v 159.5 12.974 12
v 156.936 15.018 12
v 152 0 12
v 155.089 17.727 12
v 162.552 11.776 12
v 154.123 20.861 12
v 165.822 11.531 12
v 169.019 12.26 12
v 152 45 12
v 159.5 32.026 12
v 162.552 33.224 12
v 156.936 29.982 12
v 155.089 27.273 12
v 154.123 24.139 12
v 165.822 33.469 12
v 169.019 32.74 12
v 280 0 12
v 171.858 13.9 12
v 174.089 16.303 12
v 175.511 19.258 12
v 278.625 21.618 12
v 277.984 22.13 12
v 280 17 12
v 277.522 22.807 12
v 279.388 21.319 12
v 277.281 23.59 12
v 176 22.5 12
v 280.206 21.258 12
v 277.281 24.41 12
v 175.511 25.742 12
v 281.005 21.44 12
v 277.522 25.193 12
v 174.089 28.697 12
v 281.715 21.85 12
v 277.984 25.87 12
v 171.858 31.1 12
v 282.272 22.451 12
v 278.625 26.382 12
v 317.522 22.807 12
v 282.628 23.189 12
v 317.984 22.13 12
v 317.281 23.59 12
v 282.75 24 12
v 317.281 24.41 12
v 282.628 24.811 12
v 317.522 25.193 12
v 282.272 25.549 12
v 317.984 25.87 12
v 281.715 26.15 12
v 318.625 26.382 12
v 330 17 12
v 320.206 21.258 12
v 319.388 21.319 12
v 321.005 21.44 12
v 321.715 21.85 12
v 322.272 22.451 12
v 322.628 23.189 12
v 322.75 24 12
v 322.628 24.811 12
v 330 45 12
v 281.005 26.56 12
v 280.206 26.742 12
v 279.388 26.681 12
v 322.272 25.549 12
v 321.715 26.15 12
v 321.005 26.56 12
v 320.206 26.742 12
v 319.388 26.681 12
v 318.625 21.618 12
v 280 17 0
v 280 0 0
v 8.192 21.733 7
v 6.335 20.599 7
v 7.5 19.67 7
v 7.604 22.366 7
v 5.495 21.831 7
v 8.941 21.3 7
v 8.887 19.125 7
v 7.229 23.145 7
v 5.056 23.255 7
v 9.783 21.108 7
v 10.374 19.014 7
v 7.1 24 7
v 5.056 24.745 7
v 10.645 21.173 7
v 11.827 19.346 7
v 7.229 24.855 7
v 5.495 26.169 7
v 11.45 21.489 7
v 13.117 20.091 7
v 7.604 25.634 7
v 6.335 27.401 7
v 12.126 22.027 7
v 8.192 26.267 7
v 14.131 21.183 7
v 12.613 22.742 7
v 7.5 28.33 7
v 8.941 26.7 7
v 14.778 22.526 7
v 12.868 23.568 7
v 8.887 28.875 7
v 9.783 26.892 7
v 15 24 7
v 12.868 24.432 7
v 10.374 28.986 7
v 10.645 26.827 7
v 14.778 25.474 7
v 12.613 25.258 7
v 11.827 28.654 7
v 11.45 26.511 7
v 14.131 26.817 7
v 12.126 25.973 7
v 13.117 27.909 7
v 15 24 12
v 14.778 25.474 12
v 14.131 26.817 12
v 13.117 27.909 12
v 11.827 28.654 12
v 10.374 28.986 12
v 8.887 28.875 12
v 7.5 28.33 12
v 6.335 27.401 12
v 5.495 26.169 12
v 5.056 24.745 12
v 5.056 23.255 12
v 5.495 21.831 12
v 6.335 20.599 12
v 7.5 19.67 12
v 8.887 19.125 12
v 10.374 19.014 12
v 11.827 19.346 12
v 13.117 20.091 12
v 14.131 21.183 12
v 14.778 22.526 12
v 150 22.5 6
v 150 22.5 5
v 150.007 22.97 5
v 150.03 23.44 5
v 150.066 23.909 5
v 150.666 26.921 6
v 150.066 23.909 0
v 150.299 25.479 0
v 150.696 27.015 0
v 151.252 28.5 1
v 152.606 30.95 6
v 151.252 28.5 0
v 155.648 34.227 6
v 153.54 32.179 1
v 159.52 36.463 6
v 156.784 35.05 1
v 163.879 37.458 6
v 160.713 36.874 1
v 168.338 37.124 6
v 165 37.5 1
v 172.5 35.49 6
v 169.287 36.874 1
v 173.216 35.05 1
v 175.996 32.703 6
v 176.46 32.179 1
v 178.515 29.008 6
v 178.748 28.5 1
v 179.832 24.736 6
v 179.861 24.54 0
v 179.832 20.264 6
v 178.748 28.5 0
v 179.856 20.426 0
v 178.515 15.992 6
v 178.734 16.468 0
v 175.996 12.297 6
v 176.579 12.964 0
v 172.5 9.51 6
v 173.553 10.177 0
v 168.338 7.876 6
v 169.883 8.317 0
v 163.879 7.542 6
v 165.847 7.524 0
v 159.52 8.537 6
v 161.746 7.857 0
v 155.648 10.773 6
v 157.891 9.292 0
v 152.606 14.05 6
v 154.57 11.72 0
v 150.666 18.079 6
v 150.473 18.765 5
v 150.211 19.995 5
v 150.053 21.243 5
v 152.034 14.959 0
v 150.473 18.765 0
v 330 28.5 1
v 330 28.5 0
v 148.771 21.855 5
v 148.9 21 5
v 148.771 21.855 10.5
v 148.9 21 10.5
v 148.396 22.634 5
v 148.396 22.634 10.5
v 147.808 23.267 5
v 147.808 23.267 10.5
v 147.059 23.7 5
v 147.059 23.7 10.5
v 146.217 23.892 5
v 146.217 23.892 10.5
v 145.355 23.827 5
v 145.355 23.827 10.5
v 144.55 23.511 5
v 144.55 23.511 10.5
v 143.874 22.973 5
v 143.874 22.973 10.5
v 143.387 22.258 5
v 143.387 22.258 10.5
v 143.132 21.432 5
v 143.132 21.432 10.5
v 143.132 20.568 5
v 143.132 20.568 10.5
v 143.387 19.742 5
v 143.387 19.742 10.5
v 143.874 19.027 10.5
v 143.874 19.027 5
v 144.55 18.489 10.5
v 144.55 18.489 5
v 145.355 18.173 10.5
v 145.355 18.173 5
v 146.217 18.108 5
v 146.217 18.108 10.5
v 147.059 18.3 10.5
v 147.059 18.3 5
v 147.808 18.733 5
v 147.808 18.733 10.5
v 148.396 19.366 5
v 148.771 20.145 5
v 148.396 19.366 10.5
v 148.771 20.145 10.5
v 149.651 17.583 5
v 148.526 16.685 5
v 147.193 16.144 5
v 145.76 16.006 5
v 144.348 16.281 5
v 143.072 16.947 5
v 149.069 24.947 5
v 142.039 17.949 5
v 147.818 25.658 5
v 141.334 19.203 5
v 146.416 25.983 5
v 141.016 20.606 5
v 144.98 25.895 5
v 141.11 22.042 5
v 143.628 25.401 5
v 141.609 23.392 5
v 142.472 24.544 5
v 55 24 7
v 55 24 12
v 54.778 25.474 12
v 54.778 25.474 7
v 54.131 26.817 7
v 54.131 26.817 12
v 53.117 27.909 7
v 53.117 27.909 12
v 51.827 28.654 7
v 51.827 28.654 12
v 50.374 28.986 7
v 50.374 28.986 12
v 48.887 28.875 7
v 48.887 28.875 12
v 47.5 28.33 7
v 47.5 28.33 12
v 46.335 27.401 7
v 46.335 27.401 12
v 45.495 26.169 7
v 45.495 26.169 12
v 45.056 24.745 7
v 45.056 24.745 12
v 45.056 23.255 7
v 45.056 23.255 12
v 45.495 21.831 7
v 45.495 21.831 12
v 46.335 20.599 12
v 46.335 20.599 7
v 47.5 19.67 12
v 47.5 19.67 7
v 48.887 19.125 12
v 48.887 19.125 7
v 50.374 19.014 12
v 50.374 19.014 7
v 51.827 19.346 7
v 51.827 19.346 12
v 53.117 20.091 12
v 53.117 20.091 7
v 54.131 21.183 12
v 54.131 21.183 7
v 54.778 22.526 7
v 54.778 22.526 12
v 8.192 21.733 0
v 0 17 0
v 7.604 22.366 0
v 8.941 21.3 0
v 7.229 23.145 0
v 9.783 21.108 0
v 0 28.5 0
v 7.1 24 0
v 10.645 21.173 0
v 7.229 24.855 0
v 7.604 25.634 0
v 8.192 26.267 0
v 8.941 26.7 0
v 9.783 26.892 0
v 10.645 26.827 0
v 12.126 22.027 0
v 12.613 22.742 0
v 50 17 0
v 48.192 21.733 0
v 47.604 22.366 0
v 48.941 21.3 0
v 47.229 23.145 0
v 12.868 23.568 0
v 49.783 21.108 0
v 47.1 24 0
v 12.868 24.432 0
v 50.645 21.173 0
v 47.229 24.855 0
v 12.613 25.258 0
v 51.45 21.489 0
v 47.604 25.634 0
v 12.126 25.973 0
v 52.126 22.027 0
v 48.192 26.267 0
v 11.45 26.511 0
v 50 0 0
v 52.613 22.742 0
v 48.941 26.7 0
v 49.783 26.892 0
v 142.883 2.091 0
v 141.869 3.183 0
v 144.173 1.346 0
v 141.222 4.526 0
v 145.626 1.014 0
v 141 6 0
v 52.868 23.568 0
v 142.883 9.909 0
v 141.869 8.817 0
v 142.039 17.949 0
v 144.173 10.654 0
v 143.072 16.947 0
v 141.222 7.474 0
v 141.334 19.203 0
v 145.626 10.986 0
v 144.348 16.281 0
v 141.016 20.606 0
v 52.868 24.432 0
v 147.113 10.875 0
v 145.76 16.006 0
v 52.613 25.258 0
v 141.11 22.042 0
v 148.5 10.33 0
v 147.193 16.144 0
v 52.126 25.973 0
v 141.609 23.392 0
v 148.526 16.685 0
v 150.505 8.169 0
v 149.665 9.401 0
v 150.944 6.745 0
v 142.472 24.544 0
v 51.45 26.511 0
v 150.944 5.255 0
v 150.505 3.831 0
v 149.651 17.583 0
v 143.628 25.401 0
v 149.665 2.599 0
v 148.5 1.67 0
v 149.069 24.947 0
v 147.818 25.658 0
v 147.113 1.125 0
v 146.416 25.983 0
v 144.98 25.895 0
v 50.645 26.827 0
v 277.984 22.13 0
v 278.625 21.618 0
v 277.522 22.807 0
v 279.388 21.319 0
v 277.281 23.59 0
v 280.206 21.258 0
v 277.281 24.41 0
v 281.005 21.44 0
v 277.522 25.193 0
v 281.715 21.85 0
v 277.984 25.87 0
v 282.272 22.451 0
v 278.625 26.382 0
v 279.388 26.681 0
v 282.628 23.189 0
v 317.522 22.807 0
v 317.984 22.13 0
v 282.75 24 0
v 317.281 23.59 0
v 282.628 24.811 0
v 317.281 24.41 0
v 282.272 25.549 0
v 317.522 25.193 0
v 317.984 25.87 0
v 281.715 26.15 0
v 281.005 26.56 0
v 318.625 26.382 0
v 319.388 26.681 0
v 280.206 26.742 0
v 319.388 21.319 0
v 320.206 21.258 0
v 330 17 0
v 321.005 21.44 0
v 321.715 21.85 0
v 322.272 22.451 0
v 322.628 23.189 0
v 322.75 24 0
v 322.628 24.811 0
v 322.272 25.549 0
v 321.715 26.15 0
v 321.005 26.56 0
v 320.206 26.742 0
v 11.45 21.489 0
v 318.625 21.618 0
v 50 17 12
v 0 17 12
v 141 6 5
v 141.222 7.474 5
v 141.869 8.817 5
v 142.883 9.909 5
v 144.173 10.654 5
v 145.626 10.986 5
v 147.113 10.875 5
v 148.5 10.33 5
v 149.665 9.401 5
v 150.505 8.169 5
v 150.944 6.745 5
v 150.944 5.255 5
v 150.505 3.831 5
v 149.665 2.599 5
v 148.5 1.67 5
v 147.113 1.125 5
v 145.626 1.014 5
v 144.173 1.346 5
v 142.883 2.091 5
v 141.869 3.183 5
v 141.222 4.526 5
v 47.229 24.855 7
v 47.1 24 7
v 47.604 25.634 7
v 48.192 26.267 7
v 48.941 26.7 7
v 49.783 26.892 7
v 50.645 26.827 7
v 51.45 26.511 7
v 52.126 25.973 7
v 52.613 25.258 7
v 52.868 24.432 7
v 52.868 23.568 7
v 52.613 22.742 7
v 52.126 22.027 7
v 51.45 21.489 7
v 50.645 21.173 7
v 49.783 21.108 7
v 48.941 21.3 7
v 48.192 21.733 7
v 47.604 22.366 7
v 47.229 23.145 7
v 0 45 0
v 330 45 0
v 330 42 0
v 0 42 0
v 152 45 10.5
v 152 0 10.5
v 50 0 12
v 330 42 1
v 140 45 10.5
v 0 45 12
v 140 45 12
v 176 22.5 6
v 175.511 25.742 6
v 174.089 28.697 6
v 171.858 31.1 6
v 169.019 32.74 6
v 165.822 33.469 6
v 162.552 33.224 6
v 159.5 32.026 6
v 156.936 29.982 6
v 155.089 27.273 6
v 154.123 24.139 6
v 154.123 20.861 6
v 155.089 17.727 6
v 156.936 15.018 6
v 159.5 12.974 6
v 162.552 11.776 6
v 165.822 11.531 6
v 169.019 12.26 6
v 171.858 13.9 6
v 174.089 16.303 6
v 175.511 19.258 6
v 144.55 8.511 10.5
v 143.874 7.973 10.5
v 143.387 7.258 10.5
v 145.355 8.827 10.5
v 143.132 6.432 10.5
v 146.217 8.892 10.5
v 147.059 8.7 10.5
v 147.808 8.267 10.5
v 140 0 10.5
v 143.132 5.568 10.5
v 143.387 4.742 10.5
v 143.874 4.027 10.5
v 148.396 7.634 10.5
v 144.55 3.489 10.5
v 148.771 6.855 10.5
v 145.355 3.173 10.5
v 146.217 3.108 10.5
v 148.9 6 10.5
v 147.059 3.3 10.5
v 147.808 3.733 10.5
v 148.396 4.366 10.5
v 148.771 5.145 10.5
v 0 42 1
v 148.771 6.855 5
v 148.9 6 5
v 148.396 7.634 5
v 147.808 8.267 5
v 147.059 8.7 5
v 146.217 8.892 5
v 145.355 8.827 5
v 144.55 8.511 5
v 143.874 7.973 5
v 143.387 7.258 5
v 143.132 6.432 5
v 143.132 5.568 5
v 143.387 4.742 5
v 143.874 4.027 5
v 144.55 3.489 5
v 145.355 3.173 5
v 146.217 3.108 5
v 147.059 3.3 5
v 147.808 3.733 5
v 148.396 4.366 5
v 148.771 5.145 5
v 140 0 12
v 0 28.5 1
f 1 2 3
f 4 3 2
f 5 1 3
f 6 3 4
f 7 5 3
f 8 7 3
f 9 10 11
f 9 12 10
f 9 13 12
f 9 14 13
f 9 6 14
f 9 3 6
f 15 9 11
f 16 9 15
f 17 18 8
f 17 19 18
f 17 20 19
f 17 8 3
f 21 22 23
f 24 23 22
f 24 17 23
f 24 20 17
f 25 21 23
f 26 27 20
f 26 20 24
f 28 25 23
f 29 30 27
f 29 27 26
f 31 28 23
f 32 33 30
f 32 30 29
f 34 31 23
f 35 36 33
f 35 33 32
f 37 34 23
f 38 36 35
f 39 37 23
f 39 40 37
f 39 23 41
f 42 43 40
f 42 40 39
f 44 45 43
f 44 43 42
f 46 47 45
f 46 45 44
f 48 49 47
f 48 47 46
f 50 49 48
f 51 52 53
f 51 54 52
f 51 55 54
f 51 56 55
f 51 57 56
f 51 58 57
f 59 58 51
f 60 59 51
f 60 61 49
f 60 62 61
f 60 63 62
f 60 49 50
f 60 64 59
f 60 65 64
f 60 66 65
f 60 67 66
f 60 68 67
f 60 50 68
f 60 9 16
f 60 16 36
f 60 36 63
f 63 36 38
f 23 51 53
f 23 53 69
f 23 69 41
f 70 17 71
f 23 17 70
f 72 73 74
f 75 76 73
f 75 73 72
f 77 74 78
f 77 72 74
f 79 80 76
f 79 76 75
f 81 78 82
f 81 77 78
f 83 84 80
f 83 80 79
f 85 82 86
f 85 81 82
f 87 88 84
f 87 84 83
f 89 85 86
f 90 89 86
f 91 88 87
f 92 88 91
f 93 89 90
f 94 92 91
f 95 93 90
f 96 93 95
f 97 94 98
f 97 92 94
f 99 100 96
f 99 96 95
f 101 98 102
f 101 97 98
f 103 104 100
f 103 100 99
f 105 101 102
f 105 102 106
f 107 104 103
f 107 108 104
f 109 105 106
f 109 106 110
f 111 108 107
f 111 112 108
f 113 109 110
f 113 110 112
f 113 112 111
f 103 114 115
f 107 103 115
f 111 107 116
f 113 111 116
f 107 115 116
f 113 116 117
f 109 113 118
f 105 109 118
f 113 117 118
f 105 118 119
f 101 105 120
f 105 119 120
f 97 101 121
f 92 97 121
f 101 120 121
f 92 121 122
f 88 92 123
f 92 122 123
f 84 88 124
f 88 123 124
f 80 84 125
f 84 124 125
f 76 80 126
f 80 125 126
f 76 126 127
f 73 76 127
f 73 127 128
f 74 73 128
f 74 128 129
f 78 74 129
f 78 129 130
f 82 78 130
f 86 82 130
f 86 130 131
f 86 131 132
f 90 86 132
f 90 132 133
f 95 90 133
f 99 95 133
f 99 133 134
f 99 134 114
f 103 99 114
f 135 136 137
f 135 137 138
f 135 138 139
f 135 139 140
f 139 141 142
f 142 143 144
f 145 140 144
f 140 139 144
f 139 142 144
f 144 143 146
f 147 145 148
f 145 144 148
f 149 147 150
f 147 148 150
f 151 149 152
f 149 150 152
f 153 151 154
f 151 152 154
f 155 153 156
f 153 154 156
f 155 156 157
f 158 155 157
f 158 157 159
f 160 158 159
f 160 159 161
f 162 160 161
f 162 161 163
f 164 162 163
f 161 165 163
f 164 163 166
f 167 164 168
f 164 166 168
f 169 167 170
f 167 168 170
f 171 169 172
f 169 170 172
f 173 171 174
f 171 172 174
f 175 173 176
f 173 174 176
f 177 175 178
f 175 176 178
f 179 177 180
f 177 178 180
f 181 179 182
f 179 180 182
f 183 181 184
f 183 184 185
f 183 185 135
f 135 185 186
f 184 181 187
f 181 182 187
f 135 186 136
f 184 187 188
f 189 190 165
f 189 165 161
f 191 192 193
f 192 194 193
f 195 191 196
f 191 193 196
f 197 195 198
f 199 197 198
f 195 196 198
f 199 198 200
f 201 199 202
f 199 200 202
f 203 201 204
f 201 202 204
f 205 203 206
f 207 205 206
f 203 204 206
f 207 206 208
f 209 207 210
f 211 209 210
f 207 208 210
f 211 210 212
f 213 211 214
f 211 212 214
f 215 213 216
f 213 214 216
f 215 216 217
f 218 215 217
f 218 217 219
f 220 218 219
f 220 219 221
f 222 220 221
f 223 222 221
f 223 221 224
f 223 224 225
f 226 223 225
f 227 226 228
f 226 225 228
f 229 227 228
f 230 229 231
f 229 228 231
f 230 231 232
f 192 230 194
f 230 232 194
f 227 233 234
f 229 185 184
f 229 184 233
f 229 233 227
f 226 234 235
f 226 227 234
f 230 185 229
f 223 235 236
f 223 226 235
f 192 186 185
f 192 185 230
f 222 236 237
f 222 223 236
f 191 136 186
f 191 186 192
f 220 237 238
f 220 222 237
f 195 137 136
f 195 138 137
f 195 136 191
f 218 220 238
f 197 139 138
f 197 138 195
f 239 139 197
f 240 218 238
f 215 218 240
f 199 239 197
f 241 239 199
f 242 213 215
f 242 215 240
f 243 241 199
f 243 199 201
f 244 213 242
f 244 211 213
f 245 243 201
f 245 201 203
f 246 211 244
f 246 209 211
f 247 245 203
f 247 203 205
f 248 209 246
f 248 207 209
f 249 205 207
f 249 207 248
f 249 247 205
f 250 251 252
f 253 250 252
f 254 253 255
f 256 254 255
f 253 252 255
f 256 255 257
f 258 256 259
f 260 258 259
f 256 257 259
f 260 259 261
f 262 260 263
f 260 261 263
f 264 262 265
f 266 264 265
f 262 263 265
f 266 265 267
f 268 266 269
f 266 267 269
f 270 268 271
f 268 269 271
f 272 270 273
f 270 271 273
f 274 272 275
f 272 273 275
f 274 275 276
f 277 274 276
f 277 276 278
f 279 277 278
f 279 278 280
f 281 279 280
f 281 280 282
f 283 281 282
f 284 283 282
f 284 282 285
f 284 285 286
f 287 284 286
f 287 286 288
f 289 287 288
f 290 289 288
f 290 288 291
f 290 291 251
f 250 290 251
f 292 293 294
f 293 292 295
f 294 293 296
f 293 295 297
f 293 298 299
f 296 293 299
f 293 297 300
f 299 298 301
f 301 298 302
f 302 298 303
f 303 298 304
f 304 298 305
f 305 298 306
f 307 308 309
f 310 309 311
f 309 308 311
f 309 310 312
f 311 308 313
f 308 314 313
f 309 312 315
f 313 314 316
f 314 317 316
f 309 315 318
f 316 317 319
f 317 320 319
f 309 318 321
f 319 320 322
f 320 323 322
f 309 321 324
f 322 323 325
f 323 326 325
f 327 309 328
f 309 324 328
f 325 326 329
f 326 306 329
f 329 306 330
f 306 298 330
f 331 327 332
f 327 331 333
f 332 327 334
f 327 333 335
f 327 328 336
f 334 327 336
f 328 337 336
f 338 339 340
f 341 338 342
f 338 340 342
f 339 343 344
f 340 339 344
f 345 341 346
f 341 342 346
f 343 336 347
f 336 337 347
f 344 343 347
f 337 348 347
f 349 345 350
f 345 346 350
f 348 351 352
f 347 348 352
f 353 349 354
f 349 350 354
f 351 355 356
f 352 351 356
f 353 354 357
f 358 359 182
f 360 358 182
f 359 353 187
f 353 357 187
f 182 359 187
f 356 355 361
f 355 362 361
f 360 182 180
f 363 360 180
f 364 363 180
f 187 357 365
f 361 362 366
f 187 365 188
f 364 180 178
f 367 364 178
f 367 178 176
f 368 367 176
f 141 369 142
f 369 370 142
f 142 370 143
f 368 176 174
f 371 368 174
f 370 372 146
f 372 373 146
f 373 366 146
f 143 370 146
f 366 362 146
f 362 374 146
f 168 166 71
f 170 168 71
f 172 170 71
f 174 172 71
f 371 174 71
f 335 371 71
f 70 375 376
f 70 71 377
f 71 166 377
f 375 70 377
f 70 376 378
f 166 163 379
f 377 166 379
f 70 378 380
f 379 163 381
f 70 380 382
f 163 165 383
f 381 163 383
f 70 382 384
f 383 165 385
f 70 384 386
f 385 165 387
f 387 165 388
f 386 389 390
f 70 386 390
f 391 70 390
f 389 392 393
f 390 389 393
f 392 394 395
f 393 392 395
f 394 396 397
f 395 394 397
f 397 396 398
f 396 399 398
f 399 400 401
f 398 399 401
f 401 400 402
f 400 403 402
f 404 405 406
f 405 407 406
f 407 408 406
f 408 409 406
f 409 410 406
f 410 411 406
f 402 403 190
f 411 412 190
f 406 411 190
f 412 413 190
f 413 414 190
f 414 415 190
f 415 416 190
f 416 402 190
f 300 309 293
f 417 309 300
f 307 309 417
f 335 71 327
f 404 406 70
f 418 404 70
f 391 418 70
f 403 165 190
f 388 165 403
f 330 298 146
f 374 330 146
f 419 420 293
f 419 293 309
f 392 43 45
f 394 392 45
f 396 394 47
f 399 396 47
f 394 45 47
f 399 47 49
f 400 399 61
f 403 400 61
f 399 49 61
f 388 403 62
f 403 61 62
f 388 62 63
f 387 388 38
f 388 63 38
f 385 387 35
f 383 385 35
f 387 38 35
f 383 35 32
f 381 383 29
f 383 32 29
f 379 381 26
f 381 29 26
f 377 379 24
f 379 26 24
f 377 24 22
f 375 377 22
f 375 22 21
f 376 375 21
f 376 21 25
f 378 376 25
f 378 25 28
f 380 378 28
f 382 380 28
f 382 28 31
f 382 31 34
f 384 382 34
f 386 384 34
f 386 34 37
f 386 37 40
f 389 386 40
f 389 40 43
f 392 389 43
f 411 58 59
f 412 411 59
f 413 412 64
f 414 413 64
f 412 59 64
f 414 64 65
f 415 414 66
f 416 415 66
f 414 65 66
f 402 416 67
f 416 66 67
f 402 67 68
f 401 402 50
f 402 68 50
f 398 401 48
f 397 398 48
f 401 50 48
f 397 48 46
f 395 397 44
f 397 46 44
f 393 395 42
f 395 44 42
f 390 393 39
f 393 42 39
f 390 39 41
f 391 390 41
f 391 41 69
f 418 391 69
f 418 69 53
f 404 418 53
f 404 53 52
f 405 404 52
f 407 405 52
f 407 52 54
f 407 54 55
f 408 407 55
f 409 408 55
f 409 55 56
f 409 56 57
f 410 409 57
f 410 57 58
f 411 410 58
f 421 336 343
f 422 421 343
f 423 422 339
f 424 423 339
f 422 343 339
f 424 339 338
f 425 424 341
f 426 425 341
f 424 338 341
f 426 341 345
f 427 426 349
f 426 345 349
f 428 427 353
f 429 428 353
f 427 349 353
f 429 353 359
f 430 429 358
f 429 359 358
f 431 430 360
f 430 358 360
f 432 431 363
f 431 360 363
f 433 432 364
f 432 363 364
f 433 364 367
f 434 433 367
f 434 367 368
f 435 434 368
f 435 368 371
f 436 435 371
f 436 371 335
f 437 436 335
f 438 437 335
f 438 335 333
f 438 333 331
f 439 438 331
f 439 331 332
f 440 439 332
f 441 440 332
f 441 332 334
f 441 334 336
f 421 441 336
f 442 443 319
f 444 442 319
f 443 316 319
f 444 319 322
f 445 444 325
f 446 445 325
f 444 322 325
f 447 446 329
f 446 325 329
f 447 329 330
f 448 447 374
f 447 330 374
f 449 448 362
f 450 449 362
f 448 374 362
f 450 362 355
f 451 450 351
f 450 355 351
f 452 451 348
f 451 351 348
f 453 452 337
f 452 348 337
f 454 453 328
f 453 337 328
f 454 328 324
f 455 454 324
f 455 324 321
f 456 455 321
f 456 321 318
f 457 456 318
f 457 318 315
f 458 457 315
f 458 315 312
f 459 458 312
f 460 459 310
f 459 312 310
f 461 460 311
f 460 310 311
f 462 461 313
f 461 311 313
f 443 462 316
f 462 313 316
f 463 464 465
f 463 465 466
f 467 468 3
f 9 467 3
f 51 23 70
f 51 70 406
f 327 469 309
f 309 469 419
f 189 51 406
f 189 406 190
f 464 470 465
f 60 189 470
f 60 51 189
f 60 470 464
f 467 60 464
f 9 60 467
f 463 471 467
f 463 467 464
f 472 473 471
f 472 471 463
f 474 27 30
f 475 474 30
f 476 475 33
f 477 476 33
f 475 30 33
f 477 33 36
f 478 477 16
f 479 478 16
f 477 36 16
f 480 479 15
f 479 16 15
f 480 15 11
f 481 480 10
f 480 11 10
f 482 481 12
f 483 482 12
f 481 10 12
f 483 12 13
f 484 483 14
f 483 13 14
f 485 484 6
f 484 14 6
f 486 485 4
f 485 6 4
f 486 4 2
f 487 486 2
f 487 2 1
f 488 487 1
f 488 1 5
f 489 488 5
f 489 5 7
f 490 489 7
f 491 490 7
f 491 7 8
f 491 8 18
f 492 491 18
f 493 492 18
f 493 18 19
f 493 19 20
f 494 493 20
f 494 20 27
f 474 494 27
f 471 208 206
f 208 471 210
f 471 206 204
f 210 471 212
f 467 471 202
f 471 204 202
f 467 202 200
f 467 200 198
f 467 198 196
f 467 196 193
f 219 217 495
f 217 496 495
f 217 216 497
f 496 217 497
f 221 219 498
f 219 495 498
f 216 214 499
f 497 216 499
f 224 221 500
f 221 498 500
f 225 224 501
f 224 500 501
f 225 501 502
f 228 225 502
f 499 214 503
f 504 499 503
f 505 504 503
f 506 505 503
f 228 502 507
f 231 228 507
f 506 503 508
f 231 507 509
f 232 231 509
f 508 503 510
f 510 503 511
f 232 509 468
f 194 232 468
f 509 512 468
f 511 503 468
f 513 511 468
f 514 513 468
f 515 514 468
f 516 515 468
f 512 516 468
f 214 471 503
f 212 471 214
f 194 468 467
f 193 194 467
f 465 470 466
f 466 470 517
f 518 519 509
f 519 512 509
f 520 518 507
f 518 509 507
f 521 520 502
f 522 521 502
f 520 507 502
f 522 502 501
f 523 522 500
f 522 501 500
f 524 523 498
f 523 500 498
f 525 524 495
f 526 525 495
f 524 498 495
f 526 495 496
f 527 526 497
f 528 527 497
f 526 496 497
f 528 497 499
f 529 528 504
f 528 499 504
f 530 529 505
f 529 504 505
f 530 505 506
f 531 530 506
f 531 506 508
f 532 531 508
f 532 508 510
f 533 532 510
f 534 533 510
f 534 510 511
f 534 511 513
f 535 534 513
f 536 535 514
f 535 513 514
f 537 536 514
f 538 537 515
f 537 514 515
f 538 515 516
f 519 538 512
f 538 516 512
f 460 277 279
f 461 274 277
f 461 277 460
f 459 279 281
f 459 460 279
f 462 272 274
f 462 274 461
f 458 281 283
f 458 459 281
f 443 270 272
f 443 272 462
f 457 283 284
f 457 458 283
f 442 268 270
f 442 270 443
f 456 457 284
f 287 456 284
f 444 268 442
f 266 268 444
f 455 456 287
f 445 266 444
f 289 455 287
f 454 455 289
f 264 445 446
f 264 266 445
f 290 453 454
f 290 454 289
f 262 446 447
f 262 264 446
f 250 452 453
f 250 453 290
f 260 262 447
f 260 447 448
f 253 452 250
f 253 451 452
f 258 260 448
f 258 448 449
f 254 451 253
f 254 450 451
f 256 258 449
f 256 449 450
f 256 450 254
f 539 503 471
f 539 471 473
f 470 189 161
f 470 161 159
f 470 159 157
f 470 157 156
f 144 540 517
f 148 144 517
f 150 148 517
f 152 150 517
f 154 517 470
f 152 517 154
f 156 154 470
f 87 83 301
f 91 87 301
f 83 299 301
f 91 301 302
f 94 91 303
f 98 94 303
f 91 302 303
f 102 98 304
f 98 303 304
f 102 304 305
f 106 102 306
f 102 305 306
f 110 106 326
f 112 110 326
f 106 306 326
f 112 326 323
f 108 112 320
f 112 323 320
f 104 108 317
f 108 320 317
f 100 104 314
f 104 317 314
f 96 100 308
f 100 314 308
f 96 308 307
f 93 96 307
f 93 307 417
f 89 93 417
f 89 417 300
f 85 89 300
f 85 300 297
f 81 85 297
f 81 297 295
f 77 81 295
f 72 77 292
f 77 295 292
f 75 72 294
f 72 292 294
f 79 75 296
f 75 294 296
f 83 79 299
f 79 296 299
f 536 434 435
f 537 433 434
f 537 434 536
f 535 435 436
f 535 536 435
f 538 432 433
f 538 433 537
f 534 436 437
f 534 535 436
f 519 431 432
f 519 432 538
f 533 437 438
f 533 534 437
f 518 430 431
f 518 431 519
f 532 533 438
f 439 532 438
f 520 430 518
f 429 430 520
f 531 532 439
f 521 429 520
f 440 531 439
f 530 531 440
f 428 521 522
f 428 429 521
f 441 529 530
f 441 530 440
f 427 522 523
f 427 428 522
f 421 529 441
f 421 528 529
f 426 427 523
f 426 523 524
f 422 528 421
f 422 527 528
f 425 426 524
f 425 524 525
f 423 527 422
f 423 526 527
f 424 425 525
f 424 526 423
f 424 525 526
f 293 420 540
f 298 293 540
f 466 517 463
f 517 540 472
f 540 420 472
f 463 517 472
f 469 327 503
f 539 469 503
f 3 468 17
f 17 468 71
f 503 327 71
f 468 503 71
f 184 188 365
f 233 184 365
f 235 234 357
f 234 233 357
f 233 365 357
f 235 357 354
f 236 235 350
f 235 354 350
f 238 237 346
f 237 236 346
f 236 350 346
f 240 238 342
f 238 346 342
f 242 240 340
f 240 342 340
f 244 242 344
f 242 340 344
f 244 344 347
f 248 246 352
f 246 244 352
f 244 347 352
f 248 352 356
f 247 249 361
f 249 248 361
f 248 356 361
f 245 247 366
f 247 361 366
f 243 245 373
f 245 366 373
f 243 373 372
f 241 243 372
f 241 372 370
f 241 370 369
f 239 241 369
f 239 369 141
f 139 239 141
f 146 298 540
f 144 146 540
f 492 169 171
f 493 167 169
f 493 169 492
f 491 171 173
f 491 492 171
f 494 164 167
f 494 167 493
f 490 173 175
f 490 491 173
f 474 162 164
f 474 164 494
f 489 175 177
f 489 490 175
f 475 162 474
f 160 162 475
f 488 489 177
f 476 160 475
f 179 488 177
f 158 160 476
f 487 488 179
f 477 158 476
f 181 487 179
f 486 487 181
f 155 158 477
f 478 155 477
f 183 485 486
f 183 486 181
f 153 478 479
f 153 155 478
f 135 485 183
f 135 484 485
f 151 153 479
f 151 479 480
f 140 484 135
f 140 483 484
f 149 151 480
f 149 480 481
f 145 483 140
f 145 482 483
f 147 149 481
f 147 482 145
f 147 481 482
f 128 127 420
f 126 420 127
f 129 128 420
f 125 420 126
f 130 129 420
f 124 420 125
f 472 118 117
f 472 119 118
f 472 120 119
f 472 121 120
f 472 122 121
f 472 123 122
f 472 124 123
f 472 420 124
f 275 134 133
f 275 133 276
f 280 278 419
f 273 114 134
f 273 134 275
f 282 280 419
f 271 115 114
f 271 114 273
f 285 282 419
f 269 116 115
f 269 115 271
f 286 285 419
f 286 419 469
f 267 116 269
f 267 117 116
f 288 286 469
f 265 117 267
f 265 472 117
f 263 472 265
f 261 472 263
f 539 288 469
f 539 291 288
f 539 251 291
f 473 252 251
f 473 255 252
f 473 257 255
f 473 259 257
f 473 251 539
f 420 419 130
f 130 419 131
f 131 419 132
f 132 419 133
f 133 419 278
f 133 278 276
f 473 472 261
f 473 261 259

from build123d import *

# Parameters (mm, degrees)
SKETCH_1_W                   = 330
SKETCH_1_H                   = 45
EXTRUDE_1_DEPTH              = 12
HOLE_WIZARD_M5_1_D           = 5.8
HOLE_WIZARD_M5_1_CBORE_D     = 10
HOLE_WIZARD_M5_1_CBORE_DEPTH = 5
SKETCH_4_W                   = 1
SKETCH_4_H                   = 16.5
CUT_EXTRUDE_1_DEPTH          = 334.27016068
SKETCH_5_W                   = 330
SKETCH_5_H                   = 3
EXTRUDE_2_DEPTH              = 1
SKETCH_6_R                   = 11
CUT_EXTRUDE_2_DEPTH          = 334.27016068
SKETCH_9_W                   = 50
SKETCH_9_H                   = 17
CUT_EXTRUDE_5_DEPTH          = 334.27016068
SKETCH_10_W                  = 12
SKETCH_10_H                  = 1.5
CUT_EXTRUDE_6_DEPTH          = 334.27016068
SKETCH_11_R                  = 15
CUT_EXTRUDE_7_DEPTH          = 6
SKETCH_14_R                  = 2.75
CUT_EXTRUDE_8_DEPTH          = 334.27016068
HOLE_WIZARD_M5_2_D           = 5.8
HOLE_WIZARD_M5_2_CBORE_D     = 10
HOLE_WIZARD_M5_2_CBORE_DEPTH = 5


with BuildPart() as part:
    # 草图1 → 凸台-拉伸1 (new body)
    with BuildSketch(Plane.XY):
        with Locations((165, 22.5)):
            Rectangle(SKETCH_1_W, SKETCH_1_H)
    extrude(amount=EXTRUDE_1_DEPTH)

    # M5 六角凹头螺钉的柱形沉头孔1 (through all)
    with Locations(Plane.XY.offset(12)):
        with Locations((10, 24), (50, 24)):
            CounterBoreHole(HOLE_WIZARD_M5_1_D / 2, HOLE_WIZARD_M5_1_CBORE_D / 2, HOLE_WIZARD_M5_1_CBORE_DEPTH)

    # 草图4 → 切除-拉伸1 (cut, through all)
    with BuildSketch(Plane.ZY):
        with Locations((0.5, 36.75)):
            Rectangle(SKETCH_4_W, SKETCH_4_H)
    extrude(amount=-CUT_EXTRUDE_1_DEPTH, mode=Mode.SUBTRACT)

    # 草图5 → 凸台-拉伸2 (add)
    with BuildSketch(Plane(origin=(0, 0, 1), x_dir=(-1, 0, 0), z_dir=(0, 0, -1))):
        with Locations((-165, 43.5)):
            Rectangle(SKETCH_5_W, SKETCH_5_H)
    extrude(amount=EXTRUDE_2_DEPTH)

    # 草图6 → 切除-拉伸2 (cut, through all)
    with BuildSketch(Plane.XY.offset(12)):
        with Locations((165, 22.5)):
            Circle(SKETCH_6_R)
    extrude(amount=-CUT_EXTRUDE_2_DEPTH, mode=Mode.SUBTRACT)

    # 草图9 → 切除-拉伸5 (cut, through all)
    with BuildSketch(Plane.XY.offset(12)):
        with Locations((25, 8.5)):
            Rectangle(SKETCH_9_W, SKETCH_9_H)
        with Locations((305, 8.5)):
            Rectangle(SKETCH_9_W, SKETCH_9_H)
    extrude(amount=-CUT_EXTRUDE_5_DEPTH, mode=Mode.SUBTRACT)

    # 草图10 → 切除-拉伸6 (cut, through all)
    with BuildSketch(Plane.XZ):
        with Locations((146, 11.25)):
            Rectangle(SKETCH_10_W, SKETCH_10_H)
    extrude(amount=-CUT_EXTRUDE_6_DEPTH, mode=Mode.SUBTRACT)

    # 草图11 → 切除-拉伸7 (cut)
    with BuildSketch(Plane(origin=(0, 0, 0), x_dir=(-1, 0, 0), z_dir=(0, 0, -1))):
        with Locations((-165, 22.5)):
            Circle(SKETCH_11_R)
    extrude(amount=-CUT_EXTRUDE_7_DEPTH, mode=Mode.SUBTRACT)

    # 草图14 → 切除-拉伸8 (cut, through all)
    with BuildSketch(Plane.XY.offset(12)):
        with Locations((280, 24)):
            Circle(SKETCH_14_R)
        with Locations((320, 24)):
            Circle(SKETCH_14_R)
    extrude(amount=-CUT_EXTRUDE_8_DEPTH, mode=Mode.SUBTRACT)

    # M5 六角凹头螺钉的柱形沉头孔2 (through all)
    with Locations(Plane(origin=(0, 0, 0), x_dir=(-1, 0, 0), z_dir=(0, 0, -1))):
        with Locations((-146, 6), (-146, 21)):
            CounterBoreHole(HOLE_WIZARD_M5_2_D / 2, HOLE_WIZARD_M5_2_CBORE_D / 2, HOLE_WIZARD_M5_2_CBORE_DEPTH)


solid = part.part
